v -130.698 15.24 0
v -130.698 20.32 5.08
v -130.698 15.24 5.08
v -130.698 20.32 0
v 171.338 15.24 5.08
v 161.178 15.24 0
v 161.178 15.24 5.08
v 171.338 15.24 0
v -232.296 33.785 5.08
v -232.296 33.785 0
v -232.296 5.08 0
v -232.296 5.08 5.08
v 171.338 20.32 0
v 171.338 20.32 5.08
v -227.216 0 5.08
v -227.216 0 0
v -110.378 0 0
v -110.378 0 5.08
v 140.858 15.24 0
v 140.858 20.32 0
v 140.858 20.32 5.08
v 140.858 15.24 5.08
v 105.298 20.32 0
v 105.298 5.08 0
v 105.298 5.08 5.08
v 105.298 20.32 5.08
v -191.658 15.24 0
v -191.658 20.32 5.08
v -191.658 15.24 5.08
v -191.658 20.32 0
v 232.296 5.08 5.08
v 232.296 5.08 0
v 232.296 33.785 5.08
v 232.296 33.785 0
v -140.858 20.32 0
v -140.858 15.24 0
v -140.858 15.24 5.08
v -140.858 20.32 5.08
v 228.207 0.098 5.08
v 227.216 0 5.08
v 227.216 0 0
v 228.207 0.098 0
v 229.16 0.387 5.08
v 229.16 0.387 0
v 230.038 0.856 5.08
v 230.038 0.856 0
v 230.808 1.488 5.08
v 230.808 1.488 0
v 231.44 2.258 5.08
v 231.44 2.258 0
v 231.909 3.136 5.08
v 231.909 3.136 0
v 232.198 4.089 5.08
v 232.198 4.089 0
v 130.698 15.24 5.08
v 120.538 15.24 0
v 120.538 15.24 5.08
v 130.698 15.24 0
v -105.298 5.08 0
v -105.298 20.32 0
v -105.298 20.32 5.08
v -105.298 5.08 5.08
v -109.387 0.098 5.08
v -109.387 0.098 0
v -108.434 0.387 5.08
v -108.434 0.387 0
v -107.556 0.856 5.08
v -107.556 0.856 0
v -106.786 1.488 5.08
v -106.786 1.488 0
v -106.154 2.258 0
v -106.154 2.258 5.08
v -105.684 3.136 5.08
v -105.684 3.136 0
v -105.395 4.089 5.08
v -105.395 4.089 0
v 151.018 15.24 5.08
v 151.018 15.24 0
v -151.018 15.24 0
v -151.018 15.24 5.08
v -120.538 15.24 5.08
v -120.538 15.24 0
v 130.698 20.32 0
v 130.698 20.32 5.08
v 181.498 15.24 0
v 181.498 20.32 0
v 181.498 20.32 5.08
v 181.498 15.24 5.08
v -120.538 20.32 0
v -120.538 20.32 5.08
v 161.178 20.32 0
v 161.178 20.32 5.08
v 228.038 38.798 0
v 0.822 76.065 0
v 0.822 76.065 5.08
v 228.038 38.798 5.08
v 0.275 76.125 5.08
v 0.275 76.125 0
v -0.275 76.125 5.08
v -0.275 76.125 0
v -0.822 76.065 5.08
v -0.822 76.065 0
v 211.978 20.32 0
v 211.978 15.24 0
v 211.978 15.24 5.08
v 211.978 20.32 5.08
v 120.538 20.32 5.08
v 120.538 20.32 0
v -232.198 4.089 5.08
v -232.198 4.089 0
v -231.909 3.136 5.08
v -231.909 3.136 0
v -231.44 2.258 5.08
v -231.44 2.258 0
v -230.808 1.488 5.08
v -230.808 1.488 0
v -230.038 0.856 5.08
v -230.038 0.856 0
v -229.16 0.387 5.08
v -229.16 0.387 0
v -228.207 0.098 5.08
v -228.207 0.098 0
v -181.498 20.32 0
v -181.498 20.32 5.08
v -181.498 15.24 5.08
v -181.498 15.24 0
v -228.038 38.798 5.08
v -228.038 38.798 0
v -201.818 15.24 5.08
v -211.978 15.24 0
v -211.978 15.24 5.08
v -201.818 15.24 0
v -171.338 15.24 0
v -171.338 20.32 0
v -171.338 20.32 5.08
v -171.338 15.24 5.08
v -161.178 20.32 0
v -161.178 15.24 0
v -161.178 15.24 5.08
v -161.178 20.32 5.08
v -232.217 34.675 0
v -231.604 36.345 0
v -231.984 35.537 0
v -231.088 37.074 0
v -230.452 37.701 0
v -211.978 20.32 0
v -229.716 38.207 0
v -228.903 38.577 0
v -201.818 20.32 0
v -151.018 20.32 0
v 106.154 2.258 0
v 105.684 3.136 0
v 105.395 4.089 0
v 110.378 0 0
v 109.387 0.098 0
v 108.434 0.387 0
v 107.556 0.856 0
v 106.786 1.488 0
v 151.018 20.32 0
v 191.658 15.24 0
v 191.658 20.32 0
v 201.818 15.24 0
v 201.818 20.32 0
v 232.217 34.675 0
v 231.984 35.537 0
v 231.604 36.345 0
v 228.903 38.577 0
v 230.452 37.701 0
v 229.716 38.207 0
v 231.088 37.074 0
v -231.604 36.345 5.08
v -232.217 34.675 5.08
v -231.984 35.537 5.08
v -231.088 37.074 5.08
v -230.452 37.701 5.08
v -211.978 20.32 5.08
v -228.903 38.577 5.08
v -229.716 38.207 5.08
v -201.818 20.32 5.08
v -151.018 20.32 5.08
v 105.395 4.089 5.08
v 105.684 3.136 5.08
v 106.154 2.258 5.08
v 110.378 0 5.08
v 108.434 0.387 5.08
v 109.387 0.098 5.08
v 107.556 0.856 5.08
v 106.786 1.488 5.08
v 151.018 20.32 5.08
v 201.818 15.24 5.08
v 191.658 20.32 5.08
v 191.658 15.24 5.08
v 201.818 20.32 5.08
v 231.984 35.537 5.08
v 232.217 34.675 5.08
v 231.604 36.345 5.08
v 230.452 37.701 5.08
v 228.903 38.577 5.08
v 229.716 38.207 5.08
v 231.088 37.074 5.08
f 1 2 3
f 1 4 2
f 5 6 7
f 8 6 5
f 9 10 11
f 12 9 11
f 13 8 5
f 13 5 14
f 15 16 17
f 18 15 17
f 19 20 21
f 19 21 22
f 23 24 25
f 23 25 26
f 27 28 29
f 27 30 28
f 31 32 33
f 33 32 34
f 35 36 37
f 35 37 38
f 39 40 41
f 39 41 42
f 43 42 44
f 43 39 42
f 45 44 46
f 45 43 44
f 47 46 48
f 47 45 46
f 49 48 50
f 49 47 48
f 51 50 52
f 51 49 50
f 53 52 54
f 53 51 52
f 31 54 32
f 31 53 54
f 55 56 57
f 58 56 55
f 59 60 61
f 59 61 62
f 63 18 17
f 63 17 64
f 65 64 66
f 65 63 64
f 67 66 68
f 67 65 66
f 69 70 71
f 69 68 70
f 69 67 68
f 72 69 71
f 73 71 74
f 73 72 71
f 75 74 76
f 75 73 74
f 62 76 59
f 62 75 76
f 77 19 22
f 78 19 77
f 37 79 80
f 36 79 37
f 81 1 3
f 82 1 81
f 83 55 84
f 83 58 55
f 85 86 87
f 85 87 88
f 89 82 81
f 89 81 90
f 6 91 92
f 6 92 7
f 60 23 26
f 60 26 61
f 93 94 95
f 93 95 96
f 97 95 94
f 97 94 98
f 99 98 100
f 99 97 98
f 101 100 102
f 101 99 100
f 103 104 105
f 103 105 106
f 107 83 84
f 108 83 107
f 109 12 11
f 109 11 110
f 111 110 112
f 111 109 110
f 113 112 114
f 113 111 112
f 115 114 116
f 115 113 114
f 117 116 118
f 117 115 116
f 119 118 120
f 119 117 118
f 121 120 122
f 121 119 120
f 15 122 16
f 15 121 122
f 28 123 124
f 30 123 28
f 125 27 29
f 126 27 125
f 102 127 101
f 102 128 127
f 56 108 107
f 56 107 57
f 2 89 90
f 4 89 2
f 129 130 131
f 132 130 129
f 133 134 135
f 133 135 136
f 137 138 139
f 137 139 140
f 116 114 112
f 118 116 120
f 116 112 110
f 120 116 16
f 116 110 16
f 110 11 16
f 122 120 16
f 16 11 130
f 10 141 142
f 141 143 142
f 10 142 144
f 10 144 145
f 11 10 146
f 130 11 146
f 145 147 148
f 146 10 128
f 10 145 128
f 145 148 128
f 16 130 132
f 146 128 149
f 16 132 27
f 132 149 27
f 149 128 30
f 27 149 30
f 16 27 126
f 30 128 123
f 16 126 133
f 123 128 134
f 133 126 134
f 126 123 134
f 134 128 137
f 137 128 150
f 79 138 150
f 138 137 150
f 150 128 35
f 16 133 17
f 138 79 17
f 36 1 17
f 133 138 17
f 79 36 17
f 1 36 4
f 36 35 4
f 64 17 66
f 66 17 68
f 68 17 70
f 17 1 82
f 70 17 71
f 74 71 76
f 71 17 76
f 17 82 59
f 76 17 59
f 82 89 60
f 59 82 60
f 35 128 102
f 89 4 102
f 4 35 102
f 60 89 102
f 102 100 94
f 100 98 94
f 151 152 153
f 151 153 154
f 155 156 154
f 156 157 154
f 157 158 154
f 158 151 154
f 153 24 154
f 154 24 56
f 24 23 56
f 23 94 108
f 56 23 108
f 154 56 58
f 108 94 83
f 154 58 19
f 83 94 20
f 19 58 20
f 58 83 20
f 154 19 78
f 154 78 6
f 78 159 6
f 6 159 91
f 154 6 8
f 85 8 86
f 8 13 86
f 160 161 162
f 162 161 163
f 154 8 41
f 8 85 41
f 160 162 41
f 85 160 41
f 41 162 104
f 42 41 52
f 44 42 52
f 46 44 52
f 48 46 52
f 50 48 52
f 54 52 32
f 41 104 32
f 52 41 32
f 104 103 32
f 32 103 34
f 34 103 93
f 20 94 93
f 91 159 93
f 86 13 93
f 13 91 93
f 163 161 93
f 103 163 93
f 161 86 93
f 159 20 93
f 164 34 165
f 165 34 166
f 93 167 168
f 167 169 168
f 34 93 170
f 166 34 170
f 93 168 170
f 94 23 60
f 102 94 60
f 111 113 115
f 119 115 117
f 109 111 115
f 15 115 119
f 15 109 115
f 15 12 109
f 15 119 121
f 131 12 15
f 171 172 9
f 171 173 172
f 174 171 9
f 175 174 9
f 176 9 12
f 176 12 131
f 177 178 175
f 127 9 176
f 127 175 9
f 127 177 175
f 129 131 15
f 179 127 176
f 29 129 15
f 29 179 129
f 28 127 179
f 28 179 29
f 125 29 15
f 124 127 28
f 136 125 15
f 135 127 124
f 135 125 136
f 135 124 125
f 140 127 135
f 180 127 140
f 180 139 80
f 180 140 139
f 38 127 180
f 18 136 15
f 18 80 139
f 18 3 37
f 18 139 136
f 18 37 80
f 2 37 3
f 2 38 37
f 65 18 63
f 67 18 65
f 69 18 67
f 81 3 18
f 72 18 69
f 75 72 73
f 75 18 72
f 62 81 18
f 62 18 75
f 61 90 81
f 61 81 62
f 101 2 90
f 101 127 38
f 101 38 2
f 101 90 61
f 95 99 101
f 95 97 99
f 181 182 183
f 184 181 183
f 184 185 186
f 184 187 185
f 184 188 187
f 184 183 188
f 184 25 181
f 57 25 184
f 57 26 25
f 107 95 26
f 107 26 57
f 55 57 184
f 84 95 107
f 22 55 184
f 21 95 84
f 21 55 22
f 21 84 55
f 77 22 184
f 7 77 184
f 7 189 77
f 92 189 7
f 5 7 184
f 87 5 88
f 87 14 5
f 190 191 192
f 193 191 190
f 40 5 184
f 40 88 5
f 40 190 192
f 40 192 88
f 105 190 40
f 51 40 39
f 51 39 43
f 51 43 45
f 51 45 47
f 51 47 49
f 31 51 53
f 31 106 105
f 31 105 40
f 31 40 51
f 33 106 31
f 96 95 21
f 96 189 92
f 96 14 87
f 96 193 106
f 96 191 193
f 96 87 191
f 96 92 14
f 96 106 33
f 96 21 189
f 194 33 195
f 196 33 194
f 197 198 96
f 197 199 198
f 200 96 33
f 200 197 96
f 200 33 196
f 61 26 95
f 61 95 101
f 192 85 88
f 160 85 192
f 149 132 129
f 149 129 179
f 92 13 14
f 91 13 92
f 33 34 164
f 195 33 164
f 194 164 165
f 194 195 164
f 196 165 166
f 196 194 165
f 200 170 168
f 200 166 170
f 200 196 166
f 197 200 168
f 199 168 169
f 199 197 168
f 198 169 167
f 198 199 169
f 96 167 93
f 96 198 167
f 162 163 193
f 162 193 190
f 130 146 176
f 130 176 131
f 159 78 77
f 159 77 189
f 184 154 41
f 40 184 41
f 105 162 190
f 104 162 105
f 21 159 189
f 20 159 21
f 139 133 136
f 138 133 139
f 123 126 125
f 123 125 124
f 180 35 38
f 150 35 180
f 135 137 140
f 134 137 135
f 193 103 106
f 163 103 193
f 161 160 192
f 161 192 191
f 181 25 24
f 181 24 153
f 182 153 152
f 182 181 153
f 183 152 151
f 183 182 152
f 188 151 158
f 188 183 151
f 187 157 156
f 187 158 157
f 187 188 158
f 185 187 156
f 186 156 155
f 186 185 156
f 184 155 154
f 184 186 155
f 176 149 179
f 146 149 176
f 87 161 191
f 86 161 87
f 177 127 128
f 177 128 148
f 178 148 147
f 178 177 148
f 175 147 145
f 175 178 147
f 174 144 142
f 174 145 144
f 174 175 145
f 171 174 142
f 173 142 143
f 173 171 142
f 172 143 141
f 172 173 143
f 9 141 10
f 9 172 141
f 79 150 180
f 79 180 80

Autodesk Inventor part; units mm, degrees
ref_plane "YZ Plane" through (0, 0, 0) normal (1, 0, 0) x (0, 1, 0)
ref_plane "XZ Plane" through (0, 0, 0) normal (0, 1, 0) x (-1, 0, 0)
ref_plane "XY Plane" through (0, 0, 0) normal (0, 0, 1) x (1, 0, 0)
sketch "Sketch1" plane through (0, 0, 0) normal (0, 0, 1) x (1, 0, 0)
  line L0 (-232.2957, 0) -> (232.2957, 0)
  line L1 (232.2957, 0) -> (232.2957, 38.1)
  line L2 (232.2957, 38.1) -> (-232.2957, 38.1) construction
  line L3 (-232.2957, 38.1) -> (-232.2957, 0)
  line L4 (-232.2957, 38.1) -> (0, 76.2)
  line L5 (0, 76.2) -> (232.2957, 38.1)
  line L6 (0, 76.2) -> (0, 38.1) construction
  point P0 (0, 0)
  point P1 (0, 0)
  dimension "d0" = 464.5914
  dimension "d1" = 38.1
  dimension "d2" = 38.1
extrude "Extrusion1" add sketch "Sketch1" along normal blind 5.08
fillet "Fillet1" radius 5.08 3 edges at (0, 76.2, 2.54) (232.2957, 38.1, 2.54) (-232.2957, 38.1, 2.54)
fillet "Fillet2" radius 5.08 2 edges at (-232.2957, 0, 2.54) (232.2957, 0, 2.54)
sketch "Sketch2" plane through (0, 0, 0) normal (0, 0, -1) x (-1, 0, 0)
  line L0 (-211.9778, 20.32) -> (-201.8178, 20.32)
  line L1 (-201.8178, 20.32) -> (-201.8178, 15.24)
  line L2 (-201.8178, 15.24) -> (-211.9778, 15.24)
  line L3 (-211.9778, 15.24) -> (-211.9778, 20.32)
  line L4 (-191.6578, 20.32) -> (-181.4978, 20.32)
  line L5 (-181.4978, 20.32) -> (-181.4978, 15.24)
  line L6 (-181.4978, 15.24) -> (-191.6578, 15.24)
  line L7 (-191.6578, 15.24) -> (-191.6578, 20.32)
  line L8 (-171.3378, 20.32) -> (-161.1778, 20.32)
  line L9 (-161.1778, 20.32) -> (-161.1778, 15.24)
  line L10 (-161.1778, 15.24) -> (-171.3378, 15.24)
  line L11 (-171.3378, 15.24) -> (-171.3378, 20.32)
  line L12 (-151.0178, 20.32) -> (-140.8578, 20.32)
  line L13 (-140.8578, 20.32) -> (-140.8578, 15.24)
  line L14 (-140.8578, 15.24) -> (-151.0178, 15.24)
  line L15 (-151.0178, 15.24) -> (-151.0178, 20.32)
  line L16 (-130.6978, 20.32) -> (-120.5378, 20.32)
  line L17 (-120.5378, 20.32) -> (-120.5378, 15.24)
  line L18 (-120.5378, 15.24) -> (-130.6978, 15.24)
  line L19 (-130.6978, 15.24) -> (-130.6978, 20.32)
  line L20 (-45.72, 20.32) -> (-45.72, 15.24)
  line L21 (-45.72, 15.24) -> (-105.2978, 15.24) construction
  line L22 (-105.2978, 15.24) -> (-105.2978, 20.32)
  line L23 (-105.2978, 20.32) -> (-45.72, 20.32)
  line L24 (-40.64, 15.24) -> (-40.64, 20.32)
  line L25 (-40.64, 20.32) -> (40.64, 20.32)
  line L26 (40.64, 20.32) -> (40.64, 15.24)
  line L27 (40.64, 15.24) -> (-40.64, 15.24) construction
  line L28 (45.72, 15.24) -> (45.72, 20.32)
  line L29 (45.72, 20.32) -> (105.2978, 20.32)
  line L30 (105.2978, 20.32) -> (105.2978, 15.24)
  line L31 (105.2978, 15.24) -> (45.72, 15.24) construction
  arc A0 (-232.2957, 5.08) -> (-227.2157, 0) centre (-227.2157, 5.08) ccw projected
  line L32 (227.2157, 0) -> (-227.2157, 0) projected
  arc A1 (227.2157, 0) -> (232.2957, 5.08) centre (227.2157, 5.08) ccw projected
  line L33 (232.2957, 33.7853) -> (232.2957, 5.08) projected
  arc A2 (232.2957, 33.7853) -> (228.0379, 38.7983) centre (227.2157, 33.7853) ccw projected
  line L34 (0.8222, 76.0651) -> (228.0379, 38.7983) construction
  arc A3 (0.8222, 76.0651) -> (-0.8222, 76.0651) centre (0, 71.0521) ccw construction
  line L35 (-228.0379, 38.7983) -> (-0.8222, 76.0651) construction
  arc A4 (-228.0379, 38.7983) -> (-232.2957, 33.7853) centre (-227.2157, 33.7853) ccw projected
  line L36 (-232.2957, 5.08) -> (-232.2957, 33.7853) projected
  line L37 (-105.2978, 15.24) -> (-105.2978, 0)
  line L38 (227.2157, 0) -> (-227.2157, 0) projected
  line L39 (-105.2978, 20.32) -> (105.2978, 20.32)
  line L40 (105.2978, 20.32) -> (105.2978, 0)
  line L41 (105.2978, 0) -> (-105.2978, 0)
  line L42 (-105.2978, 0) -> (-105.2978, 20.32)
  point P0 (0, 0)
extrude "Extrusion2" cut sketch "Sketch2" against normal blind 5.08
fillet "Fillet3" radius 5.08 2 edges at (105.2978, 0, 2.54) (-105.2978, 0, 2.54)
mirror "Mirror1" about plane through (0, 0, 0) normal (1, 0, 0) of "Extrusion2"
properties part number "TrusSupport" material "Wood (Birch)"
